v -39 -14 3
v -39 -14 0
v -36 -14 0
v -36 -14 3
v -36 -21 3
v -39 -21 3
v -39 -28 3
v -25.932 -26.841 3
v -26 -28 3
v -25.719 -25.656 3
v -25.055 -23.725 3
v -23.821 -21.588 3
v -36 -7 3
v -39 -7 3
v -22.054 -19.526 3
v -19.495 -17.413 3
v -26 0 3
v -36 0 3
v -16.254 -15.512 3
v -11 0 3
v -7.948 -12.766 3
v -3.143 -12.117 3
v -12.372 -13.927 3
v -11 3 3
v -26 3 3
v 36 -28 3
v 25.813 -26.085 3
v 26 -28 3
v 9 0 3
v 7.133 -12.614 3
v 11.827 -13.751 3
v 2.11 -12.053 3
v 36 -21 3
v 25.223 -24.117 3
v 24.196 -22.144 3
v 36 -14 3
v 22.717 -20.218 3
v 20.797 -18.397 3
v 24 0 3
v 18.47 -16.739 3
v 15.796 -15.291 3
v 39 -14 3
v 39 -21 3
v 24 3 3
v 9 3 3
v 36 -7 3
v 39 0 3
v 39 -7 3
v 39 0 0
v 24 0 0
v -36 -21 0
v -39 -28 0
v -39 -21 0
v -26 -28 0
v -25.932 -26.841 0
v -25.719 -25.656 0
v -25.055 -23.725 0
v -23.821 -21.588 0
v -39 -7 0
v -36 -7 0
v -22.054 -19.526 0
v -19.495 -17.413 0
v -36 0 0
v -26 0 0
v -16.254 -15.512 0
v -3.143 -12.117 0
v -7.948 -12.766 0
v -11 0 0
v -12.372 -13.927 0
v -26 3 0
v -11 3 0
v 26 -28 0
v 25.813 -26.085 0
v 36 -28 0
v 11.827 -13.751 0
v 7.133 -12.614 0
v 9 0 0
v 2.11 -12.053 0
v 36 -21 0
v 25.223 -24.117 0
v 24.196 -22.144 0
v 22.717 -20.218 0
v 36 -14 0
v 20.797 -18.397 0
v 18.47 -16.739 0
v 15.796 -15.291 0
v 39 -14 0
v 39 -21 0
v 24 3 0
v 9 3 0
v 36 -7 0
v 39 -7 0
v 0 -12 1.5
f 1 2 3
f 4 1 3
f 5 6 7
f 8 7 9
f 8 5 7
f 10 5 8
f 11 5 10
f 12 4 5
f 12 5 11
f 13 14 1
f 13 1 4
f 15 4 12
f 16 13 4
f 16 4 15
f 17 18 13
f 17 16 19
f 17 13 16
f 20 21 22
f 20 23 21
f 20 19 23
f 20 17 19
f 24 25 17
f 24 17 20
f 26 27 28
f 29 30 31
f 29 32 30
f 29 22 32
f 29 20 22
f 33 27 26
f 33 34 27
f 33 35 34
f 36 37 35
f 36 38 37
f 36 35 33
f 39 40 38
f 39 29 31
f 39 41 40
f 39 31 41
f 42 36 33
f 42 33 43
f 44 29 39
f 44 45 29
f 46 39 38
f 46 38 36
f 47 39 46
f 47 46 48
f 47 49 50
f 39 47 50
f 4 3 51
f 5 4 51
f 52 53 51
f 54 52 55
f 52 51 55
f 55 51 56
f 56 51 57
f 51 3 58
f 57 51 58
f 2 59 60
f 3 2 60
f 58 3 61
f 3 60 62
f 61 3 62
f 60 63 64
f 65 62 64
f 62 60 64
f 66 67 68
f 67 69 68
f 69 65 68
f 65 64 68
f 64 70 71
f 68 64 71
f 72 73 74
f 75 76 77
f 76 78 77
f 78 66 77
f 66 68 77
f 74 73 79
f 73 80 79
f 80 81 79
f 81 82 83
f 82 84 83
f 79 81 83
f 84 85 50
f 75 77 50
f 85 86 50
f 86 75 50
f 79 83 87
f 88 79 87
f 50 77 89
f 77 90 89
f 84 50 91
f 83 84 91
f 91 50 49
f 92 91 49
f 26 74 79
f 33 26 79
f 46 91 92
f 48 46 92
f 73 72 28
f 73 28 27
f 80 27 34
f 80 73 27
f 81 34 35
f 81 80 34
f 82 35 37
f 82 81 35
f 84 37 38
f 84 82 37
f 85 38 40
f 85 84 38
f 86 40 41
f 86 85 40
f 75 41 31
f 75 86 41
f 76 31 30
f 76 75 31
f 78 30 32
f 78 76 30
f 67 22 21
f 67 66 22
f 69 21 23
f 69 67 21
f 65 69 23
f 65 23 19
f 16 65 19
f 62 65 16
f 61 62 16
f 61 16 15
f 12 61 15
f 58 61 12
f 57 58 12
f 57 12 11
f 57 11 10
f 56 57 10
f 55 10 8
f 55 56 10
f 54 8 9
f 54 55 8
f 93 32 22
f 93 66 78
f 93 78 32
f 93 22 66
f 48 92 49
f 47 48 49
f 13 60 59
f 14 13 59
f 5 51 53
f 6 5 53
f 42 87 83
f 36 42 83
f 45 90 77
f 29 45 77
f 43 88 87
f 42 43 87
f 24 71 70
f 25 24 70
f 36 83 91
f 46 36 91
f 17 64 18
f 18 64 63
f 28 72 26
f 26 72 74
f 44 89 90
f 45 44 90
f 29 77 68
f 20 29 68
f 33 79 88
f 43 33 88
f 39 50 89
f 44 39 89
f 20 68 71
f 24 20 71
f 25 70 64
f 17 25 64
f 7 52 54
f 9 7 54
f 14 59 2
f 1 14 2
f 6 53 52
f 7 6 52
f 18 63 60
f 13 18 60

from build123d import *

# Parameters (mm, degrees)
F1_DEPTH = 3


with BuildPart() as f1:
    # F0 (on Top) → F1 (new body)
    with BuildSketch(Plane.XY):
        with BuildLine():
            Line((-26, 0), (-36, 0))
            Line((-36, 0), (-36, -7))
            Line((-36, -7), (-39, -7))
            Line((-39, -7), (-39, -14))
            Line((-39, -14), (-36, -14))
            Line((-36, -14), (-36, -21))
            Line((-36, -21), (-39, -21))
            Line((-39, -21), (-39, -28))
            Line((-39, -28), (-26, -28))
            add(Edge.make_bspline(
                [(26, -28), (26, -12), (0, -12), (-26, -12), (-26, -28)],
                knots=[3.1415926536, 3.1415926536, 3.1415926536, 4.7123889804, 4.7123889804, 6.2831853072, 6.2831853072, 6.2831853072], degree=2, weights=[1, 0.7071067812, 1, 0.7071067812, 1]))
            Line((26, -28), (36, -28))
            Line((36, -28), (36, -21))
            Line((36, -21), (39, -21))
            Line((39, -21), (39, -14))
            Line((39, -14), (36, -14))
            Line((36, -14), (36, -7))
            Line((36, -7), (39, -7))
            Line((39, -7), (39, 0))
            Line((39, 0), (24, 0))
            Line((24, 0), (24, 3))
            Line((24, 3), (9, 3))
            Line((9, 3), (9, 0))
            Line((9, 0), (-11, 0))
            Line((-11, 0), (-11, 3))
            Line((-11, 3), (-26, 3))
            Line((-26, 3), (-26, 0))
        make_face()
    extrude(amount=F1_DEPTH)


solid = f1.part
